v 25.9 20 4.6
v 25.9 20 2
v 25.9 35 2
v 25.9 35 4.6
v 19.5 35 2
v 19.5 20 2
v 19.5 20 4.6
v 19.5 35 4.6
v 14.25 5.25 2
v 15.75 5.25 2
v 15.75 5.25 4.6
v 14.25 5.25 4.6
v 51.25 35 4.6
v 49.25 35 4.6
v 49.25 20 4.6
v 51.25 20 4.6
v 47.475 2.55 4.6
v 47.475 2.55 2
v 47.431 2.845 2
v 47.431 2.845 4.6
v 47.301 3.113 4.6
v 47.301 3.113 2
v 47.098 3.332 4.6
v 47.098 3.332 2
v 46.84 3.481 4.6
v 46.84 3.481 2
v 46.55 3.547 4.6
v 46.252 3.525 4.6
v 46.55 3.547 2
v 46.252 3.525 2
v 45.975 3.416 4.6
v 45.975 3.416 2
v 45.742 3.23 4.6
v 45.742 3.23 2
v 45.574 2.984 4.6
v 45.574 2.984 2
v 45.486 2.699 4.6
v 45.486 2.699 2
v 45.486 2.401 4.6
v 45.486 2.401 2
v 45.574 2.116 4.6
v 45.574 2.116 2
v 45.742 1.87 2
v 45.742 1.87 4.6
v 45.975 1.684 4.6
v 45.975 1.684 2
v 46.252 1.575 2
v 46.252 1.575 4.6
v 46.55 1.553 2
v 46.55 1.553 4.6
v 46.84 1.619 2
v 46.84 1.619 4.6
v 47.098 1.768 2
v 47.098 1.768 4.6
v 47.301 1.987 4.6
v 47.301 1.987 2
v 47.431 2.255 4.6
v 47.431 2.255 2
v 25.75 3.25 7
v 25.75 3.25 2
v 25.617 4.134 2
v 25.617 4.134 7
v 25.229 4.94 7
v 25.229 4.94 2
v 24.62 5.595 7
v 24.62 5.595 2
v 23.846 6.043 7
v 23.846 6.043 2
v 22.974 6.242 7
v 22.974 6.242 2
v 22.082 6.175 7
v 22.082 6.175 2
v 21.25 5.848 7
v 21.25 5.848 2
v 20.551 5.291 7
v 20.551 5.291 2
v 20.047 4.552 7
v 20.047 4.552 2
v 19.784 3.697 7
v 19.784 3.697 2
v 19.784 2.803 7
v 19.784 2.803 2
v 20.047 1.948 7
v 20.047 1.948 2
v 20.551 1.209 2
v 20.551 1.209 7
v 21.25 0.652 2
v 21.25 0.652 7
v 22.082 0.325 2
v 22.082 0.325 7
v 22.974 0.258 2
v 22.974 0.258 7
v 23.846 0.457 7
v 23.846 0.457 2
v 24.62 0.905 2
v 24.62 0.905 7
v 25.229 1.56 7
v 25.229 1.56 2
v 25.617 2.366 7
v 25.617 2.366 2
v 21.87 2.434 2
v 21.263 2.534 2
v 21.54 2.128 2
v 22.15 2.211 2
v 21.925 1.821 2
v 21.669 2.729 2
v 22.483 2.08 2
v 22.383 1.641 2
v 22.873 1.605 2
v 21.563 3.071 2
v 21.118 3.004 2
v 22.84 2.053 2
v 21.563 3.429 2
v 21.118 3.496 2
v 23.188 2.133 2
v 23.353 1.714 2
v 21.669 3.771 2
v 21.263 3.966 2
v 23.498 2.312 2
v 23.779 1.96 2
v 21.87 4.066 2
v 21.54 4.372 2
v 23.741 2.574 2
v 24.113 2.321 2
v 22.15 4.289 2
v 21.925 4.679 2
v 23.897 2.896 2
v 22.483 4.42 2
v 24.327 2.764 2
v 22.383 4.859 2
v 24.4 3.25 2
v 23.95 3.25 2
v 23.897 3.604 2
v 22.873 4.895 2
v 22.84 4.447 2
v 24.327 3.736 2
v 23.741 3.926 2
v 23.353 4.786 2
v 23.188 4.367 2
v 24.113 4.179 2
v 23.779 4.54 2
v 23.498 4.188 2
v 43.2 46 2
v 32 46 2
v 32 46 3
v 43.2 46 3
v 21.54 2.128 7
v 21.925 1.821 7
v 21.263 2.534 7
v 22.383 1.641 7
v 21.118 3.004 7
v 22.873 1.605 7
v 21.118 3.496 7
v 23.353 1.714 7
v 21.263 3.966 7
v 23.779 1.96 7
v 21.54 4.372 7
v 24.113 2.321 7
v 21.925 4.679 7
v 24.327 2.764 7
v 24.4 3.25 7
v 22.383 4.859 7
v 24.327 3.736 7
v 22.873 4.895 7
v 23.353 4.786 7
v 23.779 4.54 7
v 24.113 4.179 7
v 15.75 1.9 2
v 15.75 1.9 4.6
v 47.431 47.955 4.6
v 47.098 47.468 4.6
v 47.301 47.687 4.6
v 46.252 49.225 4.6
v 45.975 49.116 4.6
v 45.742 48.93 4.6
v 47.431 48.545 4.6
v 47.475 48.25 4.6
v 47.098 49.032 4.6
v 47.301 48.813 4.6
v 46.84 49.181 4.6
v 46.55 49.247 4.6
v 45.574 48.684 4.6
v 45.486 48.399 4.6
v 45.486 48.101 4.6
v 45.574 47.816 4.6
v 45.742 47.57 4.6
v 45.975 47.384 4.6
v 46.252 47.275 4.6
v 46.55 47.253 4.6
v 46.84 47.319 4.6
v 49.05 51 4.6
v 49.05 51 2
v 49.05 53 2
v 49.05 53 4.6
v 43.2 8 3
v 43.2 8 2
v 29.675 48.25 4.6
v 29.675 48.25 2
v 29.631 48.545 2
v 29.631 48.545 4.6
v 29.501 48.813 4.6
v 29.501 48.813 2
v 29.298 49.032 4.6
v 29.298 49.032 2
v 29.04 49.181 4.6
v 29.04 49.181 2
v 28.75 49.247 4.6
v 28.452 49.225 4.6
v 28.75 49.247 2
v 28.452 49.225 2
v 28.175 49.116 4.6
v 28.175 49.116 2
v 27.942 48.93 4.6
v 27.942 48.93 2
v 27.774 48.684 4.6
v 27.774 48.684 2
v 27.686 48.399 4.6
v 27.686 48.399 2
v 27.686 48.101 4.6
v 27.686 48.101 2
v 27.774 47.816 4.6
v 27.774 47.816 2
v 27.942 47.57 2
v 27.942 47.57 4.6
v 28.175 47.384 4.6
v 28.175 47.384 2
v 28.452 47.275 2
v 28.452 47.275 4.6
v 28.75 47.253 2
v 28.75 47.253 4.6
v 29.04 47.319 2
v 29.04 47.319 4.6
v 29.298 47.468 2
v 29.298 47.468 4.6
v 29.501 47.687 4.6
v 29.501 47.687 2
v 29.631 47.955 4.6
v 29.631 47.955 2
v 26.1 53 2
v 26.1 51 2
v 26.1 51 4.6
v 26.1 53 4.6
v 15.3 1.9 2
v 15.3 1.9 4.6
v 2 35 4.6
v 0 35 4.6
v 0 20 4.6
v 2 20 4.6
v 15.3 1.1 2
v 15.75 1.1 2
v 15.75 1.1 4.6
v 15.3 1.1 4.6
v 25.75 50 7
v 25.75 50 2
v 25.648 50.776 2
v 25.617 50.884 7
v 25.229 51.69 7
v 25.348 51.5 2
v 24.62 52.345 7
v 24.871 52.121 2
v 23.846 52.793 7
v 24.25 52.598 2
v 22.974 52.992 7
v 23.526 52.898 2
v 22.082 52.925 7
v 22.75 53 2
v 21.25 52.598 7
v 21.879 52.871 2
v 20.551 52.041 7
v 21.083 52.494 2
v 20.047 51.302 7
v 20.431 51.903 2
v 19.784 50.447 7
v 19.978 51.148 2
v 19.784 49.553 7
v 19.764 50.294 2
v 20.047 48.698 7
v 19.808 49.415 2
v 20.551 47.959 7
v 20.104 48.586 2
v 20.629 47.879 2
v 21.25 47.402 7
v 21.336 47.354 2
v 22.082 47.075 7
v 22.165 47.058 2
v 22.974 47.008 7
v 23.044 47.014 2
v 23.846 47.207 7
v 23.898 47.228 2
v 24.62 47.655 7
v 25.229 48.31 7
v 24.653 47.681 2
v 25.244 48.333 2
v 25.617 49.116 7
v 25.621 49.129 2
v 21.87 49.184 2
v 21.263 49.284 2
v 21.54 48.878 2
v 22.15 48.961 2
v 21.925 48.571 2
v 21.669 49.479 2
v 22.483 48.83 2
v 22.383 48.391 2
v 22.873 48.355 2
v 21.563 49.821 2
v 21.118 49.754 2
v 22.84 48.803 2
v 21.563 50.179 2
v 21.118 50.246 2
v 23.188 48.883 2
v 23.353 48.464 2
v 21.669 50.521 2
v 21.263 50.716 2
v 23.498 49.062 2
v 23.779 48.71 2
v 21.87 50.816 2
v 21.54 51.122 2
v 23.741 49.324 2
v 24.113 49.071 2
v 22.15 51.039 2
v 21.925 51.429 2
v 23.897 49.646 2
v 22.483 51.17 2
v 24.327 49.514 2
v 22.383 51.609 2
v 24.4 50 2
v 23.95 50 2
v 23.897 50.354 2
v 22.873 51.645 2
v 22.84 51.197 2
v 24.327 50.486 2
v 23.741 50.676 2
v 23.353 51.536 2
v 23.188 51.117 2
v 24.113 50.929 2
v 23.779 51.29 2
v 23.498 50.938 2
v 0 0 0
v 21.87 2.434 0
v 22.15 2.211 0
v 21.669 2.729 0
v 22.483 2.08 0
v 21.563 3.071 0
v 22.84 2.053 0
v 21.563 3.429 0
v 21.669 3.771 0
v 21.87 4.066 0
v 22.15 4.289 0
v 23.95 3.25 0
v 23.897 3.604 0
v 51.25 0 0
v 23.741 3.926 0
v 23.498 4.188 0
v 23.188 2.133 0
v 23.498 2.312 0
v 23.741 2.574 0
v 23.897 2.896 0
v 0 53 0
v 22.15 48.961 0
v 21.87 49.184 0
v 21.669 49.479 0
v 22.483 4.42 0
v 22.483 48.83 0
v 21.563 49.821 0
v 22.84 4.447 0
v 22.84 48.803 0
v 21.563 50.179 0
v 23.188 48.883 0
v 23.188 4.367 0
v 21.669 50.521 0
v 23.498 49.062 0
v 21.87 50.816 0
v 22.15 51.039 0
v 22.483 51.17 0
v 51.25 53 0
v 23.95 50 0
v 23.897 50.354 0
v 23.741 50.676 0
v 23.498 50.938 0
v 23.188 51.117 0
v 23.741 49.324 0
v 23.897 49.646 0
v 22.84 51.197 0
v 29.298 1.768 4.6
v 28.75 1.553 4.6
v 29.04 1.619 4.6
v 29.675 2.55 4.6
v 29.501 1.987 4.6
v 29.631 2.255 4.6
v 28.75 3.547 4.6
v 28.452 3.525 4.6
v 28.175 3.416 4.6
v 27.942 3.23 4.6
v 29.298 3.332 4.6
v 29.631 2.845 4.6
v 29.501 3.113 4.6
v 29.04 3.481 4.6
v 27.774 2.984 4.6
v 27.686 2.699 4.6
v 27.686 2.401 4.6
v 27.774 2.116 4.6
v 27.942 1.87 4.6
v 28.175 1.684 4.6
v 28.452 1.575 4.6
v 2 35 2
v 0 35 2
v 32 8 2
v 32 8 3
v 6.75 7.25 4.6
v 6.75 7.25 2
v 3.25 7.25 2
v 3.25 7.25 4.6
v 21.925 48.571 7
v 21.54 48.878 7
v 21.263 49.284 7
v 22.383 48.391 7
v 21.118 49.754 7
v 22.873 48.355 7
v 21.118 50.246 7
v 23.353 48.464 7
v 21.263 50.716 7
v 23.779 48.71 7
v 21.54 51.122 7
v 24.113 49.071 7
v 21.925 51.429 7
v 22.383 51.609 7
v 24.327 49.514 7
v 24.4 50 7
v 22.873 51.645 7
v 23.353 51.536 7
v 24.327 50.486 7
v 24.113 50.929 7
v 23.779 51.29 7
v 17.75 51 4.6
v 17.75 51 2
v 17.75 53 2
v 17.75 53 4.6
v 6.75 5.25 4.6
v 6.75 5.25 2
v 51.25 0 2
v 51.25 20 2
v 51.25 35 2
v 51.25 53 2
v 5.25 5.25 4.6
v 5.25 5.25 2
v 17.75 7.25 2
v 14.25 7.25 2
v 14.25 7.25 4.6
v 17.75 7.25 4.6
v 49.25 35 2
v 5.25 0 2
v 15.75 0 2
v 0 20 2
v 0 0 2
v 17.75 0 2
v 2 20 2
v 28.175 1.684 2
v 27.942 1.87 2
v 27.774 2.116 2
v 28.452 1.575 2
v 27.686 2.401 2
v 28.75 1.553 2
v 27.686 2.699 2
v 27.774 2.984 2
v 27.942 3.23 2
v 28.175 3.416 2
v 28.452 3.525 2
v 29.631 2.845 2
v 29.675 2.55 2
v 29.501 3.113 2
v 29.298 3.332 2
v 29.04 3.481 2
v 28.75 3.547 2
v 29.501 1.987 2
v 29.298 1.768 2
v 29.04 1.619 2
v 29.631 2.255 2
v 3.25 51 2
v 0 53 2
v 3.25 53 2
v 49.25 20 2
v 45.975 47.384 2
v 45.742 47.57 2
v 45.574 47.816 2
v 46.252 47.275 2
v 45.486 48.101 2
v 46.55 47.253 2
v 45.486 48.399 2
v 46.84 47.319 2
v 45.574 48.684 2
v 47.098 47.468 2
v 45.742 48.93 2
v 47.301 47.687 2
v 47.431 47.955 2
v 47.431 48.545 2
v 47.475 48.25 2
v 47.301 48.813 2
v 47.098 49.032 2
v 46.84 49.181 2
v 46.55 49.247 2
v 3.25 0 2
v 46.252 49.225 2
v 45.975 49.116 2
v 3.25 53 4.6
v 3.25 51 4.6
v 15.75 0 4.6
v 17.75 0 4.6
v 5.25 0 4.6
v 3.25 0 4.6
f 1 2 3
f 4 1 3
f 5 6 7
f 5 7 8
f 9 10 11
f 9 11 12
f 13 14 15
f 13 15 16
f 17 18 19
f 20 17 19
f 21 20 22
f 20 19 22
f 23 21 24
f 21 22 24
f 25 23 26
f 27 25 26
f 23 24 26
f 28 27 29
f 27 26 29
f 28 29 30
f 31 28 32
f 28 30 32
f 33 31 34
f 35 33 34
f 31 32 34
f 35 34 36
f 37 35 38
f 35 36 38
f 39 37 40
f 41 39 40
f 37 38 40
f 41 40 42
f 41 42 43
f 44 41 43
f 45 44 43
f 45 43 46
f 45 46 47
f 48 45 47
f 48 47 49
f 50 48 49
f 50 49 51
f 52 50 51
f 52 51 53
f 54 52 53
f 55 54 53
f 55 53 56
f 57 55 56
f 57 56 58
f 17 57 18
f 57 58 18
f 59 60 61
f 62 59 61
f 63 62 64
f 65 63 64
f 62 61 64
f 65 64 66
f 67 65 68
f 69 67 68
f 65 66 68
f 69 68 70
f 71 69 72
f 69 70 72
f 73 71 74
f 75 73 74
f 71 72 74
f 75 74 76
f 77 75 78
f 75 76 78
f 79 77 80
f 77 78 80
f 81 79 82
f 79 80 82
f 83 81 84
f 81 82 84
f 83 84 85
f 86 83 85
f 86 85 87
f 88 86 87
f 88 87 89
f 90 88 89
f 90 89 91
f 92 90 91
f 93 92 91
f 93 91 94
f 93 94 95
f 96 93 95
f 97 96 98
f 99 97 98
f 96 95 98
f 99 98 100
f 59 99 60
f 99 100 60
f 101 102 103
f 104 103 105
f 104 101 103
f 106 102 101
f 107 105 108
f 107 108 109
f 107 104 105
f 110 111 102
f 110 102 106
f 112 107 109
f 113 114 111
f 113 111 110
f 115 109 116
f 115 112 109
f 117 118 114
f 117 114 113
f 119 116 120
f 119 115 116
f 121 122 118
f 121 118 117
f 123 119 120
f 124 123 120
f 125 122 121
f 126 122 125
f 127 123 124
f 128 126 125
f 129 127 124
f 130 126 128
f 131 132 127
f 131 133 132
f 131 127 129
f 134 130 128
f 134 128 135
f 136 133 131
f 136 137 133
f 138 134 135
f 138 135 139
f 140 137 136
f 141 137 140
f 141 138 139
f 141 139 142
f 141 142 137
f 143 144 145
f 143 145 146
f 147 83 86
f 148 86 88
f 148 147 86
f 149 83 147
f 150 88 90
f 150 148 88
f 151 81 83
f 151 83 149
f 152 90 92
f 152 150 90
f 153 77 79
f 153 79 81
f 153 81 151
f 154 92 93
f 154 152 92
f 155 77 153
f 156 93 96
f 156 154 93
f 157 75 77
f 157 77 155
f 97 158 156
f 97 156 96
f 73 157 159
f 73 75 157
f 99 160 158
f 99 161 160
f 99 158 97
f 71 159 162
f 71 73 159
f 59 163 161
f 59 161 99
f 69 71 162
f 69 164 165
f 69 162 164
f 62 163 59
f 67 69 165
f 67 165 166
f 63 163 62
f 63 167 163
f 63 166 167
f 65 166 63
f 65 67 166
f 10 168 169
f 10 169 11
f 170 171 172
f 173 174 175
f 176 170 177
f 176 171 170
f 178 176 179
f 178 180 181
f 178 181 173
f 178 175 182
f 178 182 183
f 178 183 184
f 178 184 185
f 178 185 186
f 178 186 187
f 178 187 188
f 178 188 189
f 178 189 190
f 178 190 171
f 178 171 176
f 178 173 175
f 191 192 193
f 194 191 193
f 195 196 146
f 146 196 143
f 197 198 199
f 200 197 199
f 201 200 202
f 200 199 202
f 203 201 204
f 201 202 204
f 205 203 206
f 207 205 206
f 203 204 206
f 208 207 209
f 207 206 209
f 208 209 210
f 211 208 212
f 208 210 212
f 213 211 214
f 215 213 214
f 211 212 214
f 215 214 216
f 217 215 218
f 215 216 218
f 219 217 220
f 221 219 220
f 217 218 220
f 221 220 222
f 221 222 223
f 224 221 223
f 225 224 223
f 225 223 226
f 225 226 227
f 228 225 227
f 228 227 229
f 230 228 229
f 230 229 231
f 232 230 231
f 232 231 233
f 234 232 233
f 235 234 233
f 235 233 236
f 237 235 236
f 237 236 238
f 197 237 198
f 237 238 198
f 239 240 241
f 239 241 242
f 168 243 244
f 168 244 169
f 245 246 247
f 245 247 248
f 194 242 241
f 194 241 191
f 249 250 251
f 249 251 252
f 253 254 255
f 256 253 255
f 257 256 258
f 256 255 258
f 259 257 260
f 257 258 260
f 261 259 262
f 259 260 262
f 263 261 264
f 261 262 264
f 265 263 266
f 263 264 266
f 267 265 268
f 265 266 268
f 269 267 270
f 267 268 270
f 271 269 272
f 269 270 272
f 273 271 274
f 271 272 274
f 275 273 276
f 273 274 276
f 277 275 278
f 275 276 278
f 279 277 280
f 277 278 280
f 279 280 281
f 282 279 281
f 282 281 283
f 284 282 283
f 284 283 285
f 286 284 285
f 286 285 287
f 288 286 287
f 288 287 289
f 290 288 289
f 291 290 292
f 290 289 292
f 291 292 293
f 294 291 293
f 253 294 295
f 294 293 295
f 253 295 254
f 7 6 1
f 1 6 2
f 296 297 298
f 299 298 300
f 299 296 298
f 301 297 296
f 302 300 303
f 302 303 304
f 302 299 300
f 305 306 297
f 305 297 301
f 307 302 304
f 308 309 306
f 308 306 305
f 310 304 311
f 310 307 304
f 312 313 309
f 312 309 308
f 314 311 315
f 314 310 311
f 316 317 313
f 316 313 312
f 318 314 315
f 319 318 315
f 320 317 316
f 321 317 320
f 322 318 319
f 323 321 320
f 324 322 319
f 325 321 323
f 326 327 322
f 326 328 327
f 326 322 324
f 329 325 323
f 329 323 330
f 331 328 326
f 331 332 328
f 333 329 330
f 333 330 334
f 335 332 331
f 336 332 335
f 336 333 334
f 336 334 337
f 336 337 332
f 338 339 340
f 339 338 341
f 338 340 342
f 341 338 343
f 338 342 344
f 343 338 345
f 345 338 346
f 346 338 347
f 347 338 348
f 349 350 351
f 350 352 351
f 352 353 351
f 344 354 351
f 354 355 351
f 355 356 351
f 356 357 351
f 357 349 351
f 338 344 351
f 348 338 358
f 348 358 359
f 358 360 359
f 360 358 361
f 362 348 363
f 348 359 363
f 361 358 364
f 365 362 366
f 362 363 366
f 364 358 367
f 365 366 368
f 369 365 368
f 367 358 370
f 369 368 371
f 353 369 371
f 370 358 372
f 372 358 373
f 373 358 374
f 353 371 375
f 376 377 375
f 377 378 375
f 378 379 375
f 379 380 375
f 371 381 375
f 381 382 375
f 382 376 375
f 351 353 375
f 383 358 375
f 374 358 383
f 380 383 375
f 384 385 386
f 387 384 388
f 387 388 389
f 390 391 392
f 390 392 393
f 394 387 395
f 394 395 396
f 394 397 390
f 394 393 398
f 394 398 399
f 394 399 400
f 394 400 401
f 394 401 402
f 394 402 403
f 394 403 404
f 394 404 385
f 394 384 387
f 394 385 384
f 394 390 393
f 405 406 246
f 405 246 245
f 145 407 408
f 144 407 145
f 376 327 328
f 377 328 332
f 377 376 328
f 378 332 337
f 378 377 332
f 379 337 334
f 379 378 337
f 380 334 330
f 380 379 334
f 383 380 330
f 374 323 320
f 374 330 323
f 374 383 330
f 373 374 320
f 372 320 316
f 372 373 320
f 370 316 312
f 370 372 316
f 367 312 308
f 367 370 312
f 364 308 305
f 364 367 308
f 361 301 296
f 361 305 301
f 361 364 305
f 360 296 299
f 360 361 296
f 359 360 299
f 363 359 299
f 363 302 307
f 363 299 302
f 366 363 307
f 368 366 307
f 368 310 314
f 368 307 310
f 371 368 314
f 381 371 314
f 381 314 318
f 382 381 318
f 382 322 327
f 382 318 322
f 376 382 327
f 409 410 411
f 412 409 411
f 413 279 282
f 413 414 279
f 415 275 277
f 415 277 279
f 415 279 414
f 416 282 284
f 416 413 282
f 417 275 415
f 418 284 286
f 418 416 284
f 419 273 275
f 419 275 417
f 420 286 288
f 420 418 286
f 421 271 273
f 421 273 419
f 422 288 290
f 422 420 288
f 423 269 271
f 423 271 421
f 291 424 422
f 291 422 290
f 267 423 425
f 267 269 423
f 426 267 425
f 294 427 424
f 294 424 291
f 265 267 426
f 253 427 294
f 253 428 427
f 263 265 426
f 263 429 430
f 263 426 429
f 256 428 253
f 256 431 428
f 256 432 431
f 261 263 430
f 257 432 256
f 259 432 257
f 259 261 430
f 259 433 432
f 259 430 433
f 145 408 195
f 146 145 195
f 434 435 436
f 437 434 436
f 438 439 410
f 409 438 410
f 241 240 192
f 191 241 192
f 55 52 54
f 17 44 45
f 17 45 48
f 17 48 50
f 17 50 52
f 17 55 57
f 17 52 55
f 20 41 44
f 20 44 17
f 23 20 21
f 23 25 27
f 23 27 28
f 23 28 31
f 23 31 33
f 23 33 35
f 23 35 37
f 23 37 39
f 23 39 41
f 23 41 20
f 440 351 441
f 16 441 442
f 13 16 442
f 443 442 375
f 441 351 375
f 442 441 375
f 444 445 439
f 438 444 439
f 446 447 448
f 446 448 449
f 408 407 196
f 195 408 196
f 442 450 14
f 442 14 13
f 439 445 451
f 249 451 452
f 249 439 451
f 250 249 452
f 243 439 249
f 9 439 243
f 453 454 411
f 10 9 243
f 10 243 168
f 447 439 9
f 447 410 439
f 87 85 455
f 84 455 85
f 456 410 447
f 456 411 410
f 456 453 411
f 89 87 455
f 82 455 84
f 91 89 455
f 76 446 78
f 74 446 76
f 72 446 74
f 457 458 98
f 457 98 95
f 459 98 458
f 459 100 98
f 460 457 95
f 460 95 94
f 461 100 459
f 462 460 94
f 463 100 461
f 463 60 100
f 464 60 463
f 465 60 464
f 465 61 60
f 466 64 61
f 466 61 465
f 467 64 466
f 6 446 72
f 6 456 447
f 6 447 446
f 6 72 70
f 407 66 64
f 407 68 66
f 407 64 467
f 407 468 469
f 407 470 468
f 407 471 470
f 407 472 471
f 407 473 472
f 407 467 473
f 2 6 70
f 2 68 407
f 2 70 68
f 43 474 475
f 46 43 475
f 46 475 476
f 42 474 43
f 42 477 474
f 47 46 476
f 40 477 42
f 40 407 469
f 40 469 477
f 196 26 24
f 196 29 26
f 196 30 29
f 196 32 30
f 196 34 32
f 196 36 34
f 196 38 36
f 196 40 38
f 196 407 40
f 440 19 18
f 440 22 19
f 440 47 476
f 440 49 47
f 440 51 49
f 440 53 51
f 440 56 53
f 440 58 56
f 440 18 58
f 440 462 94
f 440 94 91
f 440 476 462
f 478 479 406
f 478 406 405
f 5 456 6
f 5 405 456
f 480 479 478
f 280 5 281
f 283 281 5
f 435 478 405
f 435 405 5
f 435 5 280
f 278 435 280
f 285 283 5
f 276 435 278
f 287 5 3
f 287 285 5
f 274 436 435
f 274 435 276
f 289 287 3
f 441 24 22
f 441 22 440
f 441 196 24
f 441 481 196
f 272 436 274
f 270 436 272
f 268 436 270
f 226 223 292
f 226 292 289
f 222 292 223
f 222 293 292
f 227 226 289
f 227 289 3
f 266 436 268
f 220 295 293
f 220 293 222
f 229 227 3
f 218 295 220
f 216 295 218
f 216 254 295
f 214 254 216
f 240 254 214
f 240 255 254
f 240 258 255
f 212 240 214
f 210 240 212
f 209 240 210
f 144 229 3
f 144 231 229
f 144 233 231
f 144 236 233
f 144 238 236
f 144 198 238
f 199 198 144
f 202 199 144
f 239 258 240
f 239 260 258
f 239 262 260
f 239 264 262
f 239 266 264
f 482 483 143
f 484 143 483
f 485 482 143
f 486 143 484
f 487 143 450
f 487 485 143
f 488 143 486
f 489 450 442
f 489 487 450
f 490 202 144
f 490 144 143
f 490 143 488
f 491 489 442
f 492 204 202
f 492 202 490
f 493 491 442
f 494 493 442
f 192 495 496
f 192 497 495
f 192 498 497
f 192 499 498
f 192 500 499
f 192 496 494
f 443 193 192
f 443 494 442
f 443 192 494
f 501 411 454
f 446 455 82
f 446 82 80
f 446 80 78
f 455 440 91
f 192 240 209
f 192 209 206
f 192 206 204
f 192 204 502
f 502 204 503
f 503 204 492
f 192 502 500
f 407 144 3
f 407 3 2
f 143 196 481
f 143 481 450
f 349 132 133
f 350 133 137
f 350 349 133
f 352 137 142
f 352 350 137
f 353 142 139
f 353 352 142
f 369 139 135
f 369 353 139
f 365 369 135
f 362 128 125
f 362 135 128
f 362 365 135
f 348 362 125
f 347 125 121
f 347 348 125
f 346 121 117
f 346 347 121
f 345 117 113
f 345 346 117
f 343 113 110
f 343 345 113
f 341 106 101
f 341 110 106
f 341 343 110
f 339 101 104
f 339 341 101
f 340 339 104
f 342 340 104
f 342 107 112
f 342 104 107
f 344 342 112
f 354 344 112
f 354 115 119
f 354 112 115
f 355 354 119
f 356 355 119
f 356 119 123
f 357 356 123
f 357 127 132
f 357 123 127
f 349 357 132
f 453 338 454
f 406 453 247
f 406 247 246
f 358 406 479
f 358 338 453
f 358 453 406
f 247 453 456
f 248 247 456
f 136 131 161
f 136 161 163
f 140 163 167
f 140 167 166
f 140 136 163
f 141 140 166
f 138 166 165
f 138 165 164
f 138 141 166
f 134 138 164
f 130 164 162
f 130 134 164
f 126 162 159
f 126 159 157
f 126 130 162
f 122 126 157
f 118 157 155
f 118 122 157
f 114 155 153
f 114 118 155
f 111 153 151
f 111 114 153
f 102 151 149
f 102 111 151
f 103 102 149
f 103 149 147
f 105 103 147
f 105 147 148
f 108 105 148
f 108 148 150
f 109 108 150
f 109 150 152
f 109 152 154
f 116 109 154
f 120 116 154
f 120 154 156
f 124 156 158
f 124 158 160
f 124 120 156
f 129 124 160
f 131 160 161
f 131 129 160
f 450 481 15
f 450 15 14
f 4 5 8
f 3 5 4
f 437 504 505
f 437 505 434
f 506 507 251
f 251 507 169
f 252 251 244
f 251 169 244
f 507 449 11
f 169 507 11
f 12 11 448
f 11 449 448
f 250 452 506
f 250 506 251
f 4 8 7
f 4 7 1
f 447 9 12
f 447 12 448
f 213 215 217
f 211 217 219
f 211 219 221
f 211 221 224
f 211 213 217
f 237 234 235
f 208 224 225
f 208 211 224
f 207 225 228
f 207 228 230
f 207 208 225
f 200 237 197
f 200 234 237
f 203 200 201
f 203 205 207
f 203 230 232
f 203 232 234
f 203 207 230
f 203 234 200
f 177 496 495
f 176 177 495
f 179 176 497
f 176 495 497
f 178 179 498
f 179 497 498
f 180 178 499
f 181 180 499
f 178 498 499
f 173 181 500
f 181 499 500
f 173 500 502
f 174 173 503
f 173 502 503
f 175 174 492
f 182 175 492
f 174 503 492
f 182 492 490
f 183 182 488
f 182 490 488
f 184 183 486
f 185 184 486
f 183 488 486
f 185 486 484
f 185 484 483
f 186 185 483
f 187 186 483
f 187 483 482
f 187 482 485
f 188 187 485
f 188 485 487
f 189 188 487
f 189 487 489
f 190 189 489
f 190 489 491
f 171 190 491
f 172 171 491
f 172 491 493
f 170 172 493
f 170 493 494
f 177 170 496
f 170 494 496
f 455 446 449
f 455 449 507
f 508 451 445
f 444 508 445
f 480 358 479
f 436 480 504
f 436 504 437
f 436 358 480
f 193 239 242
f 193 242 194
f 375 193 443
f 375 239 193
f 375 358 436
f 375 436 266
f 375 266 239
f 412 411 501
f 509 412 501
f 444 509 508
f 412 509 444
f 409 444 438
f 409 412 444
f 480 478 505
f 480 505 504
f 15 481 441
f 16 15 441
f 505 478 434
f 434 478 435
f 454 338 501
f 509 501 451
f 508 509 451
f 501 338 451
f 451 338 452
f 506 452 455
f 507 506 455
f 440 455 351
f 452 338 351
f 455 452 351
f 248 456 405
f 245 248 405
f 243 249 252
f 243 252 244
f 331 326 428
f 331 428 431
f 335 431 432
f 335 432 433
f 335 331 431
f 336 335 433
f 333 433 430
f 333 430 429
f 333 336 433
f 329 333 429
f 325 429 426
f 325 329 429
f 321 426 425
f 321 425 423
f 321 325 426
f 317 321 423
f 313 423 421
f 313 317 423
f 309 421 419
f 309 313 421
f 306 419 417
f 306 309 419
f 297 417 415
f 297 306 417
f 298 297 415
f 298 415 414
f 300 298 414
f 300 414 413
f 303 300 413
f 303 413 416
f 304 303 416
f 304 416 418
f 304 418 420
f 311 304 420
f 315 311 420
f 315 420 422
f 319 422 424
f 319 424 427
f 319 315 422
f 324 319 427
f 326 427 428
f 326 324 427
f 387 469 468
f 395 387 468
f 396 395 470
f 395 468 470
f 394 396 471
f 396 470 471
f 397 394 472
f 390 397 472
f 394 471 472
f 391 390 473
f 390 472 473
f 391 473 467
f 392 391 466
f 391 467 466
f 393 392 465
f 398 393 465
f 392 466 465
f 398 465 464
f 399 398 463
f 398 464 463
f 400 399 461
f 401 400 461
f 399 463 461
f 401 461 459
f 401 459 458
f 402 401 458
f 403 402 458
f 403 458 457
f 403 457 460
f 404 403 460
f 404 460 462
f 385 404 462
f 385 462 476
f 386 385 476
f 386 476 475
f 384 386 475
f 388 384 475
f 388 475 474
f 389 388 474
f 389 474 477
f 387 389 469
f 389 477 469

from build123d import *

# Parameters (mm, degrees)
SKETCH015_R      = 1.2
EXTRUDE011_DEPTH = 10
SKETCH006_W      = 11.2
SKETCH006_H      = 38
EXTRUDE001_DEPTH = 1
SKETCH007_R      = 1
SKETCH007_W      = 6.4
SKETCH007_H      = 15
SKETCH007_W_2    = 2
SKETCH007_W_3    = 14.5
SKETCH007_H_2    = 2
SKETCH007_W_4    = 22.95
EXTRUDE005_DEPTH = 2.6
SKETCH005_W      = 51.25
SKETCH005_H      = 53
EXTRUDE_DEPTH    = 2
SKETCH013_R      = 1.65
EXTRUDE009_DEPTH = 5
SKETCH012_R      = 3
EXTRUDE008_DEPTH = 5


with BuildPart() as basecut:
    # Sketch015 → Extrude011 (new body)
    with BuildSketch(Plane.XY):
        with Locations((22.75, 50)):
            Circle(SKETCH015_R)
        with Locations((22.75, 3.25)):
            Circle(SKETCH015_R)
    extrude(amount=EXTRUDE011_DEPTH)


with BuildPart() as base002:
    # Sketch006 → Extrude001 (new body)
    with BuildSketch(Plane.XY.offset(2)):
        with Locations((37.6, 27)):
            Rectangle(SKETCH006_W, SKETCH006_H)
    extrude(amount=EXTRUDE001_DEPTH)


with BuildPart() as base003:
    # Sketch007 → Extrude005 (new body)
    with BuildSketch(Plane.XY.offset(2)):
        with Locations((28.675, 48.25)):
            Circle(SKETCH007_R)
        with Locations((46.475, 48.25)):
            Circle(SKETCH007_R)
        with Locations((28.675, 2.55)):
            Circle(SKETCH007_R)
        with Locations((46.475, 2.55)):
            Circle(SKETCH007_R)
        Polygon((3.25, 0), (5.25, 0), (5.25, 5.25), (6.75, 5.25), (6.75, 7.25), (3.25, 7.25), align=None)
        Polygon((17.75, 0), (15.75, 0), (15.75, 1.1), (15.3, 1.1), (15.3, 1.9), (15.75, 1.9), (15.75, 5.25), (14.25, 5.25), (14.25, 7.25), (17.75, 7.25), align=None)
        with Locations((22.7, 27.5)):
            Rectangle(SKETCH007_W, SKETCH007_H)
        with Locations((1, 27.5)):
            Rectangle(SKETCH007_W_2, SKETCH007_H)
        with Locations((10.5, 52)):
            Rectangle(SKETCH007_W_3, SKETCH007_H_2)
        with Locations((50.25, 27.5)):
            Rectangle(SKETCH007_W_2, SKETCH007_H)
        with Locations((37.575, 52)):
            Rectangle(SKETCH007_W_4, SKETCH007_H_2)
    extrude(amount=EXTRUDE005_DEPTH)


with BuildPart() as base004:
    # Sketch005 → Extrude (new body)
    with BuildSketch(Plane.XY):
        with Locations((25.625, 26.5)):
            Rectangle(SKETCH005_W, SKETCH005_H)
    extrude(amount=EXTRUDE_DEPTH)

    # Fusion002: union base002, base003
    add(base002.part)
    add(base003.part)


with BuildPart() as extrude009:
    # Sketch013 → Extrude009 (new body)
    with BuildSketch(Plane.XY.offset(10.25)):
        with Locations((22.75, 50)):
            Circle(SKETCH013_R)
        with Locations((22.75, 3.25)):
            Circle(SKETCH013_R)
    extrude(amount=EXTRUDE009_DEPTH)


with BuildPart() as extrude009_1:
    # Extrude009 placement: moved
    add(extrude009.part.moved(Location((0, 0, -8.25))))


with BuildPart() as bottom001:
    # Sketch012 → Extrude008 (new body)
    with BuildSketch(Plane.XY.offset(10.25)):
        with Locations((22.75, 50)):
            Circle(SKETCH012_R)
        with Locations((22.75, 3.25)):
            Circle(SKETCH012_R)
    extrude(amount=EXTRUDE008_DEPTH)


with BuildPart() as bottom001_1:
    # Extrude008 placement: moved
    add(bottom001.part.moved(Location((0, 0, -8.25))))

    # Cut002: cut Extrude009
    add(extrude009_1.part, mode=Mode.SUBTRACT)

    # Fusion003: union base004
    add(base004.part)

    # Cut004: cut baseCut
    add(basecut.part, mode=Mode.SUBTRACT)


solid = bottom001_1.part
